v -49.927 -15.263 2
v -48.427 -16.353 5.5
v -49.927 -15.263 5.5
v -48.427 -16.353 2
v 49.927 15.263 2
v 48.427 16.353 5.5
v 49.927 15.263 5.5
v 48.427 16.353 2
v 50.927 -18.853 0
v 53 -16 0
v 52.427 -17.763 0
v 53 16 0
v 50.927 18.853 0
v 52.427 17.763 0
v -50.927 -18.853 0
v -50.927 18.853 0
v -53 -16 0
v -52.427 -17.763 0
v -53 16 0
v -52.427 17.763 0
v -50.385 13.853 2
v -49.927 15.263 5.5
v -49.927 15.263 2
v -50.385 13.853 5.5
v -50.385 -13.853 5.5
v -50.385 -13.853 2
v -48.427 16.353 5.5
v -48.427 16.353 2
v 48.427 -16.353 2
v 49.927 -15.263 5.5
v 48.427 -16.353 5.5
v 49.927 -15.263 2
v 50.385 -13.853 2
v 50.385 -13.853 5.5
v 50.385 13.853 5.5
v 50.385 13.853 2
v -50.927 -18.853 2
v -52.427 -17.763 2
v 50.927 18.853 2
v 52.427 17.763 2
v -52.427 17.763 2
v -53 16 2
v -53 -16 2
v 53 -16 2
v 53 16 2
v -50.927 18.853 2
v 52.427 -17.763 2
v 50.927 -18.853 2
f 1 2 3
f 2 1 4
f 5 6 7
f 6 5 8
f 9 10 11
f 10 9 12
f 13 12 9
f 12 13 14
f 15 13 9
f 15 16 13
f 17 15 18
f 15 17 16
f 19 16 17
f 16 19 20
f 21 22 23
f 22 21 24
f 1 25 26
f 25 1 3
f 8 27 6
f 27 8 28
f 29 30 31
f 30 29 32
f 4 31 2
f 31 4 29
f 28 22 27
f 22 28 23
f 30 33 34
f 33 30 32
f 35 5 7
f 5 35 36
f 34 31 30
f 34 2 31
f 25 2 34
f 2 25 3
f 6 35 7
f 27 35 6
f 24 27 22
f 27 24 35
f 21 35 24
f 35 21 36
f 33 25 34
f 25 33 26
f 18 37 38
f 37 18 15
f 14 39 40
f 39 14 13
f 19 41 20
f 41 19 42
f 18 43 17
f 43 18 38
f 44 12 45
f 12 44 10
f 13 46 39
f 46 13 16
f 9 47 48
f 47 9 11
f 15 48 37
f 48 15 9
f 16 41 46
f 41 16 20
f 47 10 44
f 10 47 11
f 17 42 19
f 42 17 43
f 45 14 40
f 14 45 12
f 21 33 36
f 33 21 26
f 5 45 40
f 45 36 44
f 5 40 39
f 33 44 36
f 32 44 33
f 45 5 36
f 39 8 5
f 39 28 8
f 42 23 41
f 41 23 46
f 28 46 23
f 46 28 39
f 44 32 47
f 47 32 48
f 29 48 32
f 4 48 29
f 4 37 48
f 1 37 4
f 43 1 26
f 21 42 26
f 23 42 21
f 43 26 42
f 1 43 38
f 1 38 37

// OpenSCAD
xI=101;
xISp=3;
yI=33;
zA=8;
zI=26;

ethCY=16;
ethCZ=14;

usbCY=10;
usbCYOff=3.5;
usbCZ=9;

pwrCY=9;
pwrCZ=12.5;

usbICX=32;
usbICYOff=-24;


wthick=2.5;

lid();

module base(){
difference(){
    rcube([xI+wthick*2,yI+wthick*2,zI+wthick],3);
    translate([0,0,wthick])rcube([xI-xISp*2,yI,zA],0);
    translate([usbICYOff,yI/2,wthick])rcube([usbICX,yI,zA],0);
    translate([0,0,wthick+zA])rcube([xI,yI,zI],0);
    translate([xI/2,0,wthick+zA])rcube([xI,ethCY,ethCZ],0);
    translate([-xI/2,usbCYOff,wthick+zA])rcube([xI,usbCY,usbCZ],0);
    translate([-xI/2,-yI/2+pwrCY/2,wthick+zA])rcube([xI,pwrCY,pwrCZ],0);
}
}

module lid(){
    rcube([xI+wthick*2,yI+wthick*2,2],3);
    difference(){
    rcube([xI,yI,2+3.5],3);
    rcube([xI*2,yI-wthick*2,2+3.5],3);
    }  
}



module rcube(size,radius){
linear_extrude(height=size[2])
if(radius>0){
hull()
{
    // place 4 circles in the corners, with the given radius
    translate([(-size[0]/2)+(radius), (-size[1]/2)+(radius), 0])
    circle(r=radius);

    translate([(size[0]/2)-(radius), (-size[1]/2)+(radius), 0])
    circle(r=radius);

    translate([(-size[0]/2)+(radius), (size[1]/2)-(radius), 0])
    circle(r=radius);

    translate([(size[0]/2)-(radius), (size[1]/2)-(radius), 0])
    circle(r=radius);
}
}
if(radius==0){
translate([0,0,size[2]/2])cube(size,center=true);
}
}
